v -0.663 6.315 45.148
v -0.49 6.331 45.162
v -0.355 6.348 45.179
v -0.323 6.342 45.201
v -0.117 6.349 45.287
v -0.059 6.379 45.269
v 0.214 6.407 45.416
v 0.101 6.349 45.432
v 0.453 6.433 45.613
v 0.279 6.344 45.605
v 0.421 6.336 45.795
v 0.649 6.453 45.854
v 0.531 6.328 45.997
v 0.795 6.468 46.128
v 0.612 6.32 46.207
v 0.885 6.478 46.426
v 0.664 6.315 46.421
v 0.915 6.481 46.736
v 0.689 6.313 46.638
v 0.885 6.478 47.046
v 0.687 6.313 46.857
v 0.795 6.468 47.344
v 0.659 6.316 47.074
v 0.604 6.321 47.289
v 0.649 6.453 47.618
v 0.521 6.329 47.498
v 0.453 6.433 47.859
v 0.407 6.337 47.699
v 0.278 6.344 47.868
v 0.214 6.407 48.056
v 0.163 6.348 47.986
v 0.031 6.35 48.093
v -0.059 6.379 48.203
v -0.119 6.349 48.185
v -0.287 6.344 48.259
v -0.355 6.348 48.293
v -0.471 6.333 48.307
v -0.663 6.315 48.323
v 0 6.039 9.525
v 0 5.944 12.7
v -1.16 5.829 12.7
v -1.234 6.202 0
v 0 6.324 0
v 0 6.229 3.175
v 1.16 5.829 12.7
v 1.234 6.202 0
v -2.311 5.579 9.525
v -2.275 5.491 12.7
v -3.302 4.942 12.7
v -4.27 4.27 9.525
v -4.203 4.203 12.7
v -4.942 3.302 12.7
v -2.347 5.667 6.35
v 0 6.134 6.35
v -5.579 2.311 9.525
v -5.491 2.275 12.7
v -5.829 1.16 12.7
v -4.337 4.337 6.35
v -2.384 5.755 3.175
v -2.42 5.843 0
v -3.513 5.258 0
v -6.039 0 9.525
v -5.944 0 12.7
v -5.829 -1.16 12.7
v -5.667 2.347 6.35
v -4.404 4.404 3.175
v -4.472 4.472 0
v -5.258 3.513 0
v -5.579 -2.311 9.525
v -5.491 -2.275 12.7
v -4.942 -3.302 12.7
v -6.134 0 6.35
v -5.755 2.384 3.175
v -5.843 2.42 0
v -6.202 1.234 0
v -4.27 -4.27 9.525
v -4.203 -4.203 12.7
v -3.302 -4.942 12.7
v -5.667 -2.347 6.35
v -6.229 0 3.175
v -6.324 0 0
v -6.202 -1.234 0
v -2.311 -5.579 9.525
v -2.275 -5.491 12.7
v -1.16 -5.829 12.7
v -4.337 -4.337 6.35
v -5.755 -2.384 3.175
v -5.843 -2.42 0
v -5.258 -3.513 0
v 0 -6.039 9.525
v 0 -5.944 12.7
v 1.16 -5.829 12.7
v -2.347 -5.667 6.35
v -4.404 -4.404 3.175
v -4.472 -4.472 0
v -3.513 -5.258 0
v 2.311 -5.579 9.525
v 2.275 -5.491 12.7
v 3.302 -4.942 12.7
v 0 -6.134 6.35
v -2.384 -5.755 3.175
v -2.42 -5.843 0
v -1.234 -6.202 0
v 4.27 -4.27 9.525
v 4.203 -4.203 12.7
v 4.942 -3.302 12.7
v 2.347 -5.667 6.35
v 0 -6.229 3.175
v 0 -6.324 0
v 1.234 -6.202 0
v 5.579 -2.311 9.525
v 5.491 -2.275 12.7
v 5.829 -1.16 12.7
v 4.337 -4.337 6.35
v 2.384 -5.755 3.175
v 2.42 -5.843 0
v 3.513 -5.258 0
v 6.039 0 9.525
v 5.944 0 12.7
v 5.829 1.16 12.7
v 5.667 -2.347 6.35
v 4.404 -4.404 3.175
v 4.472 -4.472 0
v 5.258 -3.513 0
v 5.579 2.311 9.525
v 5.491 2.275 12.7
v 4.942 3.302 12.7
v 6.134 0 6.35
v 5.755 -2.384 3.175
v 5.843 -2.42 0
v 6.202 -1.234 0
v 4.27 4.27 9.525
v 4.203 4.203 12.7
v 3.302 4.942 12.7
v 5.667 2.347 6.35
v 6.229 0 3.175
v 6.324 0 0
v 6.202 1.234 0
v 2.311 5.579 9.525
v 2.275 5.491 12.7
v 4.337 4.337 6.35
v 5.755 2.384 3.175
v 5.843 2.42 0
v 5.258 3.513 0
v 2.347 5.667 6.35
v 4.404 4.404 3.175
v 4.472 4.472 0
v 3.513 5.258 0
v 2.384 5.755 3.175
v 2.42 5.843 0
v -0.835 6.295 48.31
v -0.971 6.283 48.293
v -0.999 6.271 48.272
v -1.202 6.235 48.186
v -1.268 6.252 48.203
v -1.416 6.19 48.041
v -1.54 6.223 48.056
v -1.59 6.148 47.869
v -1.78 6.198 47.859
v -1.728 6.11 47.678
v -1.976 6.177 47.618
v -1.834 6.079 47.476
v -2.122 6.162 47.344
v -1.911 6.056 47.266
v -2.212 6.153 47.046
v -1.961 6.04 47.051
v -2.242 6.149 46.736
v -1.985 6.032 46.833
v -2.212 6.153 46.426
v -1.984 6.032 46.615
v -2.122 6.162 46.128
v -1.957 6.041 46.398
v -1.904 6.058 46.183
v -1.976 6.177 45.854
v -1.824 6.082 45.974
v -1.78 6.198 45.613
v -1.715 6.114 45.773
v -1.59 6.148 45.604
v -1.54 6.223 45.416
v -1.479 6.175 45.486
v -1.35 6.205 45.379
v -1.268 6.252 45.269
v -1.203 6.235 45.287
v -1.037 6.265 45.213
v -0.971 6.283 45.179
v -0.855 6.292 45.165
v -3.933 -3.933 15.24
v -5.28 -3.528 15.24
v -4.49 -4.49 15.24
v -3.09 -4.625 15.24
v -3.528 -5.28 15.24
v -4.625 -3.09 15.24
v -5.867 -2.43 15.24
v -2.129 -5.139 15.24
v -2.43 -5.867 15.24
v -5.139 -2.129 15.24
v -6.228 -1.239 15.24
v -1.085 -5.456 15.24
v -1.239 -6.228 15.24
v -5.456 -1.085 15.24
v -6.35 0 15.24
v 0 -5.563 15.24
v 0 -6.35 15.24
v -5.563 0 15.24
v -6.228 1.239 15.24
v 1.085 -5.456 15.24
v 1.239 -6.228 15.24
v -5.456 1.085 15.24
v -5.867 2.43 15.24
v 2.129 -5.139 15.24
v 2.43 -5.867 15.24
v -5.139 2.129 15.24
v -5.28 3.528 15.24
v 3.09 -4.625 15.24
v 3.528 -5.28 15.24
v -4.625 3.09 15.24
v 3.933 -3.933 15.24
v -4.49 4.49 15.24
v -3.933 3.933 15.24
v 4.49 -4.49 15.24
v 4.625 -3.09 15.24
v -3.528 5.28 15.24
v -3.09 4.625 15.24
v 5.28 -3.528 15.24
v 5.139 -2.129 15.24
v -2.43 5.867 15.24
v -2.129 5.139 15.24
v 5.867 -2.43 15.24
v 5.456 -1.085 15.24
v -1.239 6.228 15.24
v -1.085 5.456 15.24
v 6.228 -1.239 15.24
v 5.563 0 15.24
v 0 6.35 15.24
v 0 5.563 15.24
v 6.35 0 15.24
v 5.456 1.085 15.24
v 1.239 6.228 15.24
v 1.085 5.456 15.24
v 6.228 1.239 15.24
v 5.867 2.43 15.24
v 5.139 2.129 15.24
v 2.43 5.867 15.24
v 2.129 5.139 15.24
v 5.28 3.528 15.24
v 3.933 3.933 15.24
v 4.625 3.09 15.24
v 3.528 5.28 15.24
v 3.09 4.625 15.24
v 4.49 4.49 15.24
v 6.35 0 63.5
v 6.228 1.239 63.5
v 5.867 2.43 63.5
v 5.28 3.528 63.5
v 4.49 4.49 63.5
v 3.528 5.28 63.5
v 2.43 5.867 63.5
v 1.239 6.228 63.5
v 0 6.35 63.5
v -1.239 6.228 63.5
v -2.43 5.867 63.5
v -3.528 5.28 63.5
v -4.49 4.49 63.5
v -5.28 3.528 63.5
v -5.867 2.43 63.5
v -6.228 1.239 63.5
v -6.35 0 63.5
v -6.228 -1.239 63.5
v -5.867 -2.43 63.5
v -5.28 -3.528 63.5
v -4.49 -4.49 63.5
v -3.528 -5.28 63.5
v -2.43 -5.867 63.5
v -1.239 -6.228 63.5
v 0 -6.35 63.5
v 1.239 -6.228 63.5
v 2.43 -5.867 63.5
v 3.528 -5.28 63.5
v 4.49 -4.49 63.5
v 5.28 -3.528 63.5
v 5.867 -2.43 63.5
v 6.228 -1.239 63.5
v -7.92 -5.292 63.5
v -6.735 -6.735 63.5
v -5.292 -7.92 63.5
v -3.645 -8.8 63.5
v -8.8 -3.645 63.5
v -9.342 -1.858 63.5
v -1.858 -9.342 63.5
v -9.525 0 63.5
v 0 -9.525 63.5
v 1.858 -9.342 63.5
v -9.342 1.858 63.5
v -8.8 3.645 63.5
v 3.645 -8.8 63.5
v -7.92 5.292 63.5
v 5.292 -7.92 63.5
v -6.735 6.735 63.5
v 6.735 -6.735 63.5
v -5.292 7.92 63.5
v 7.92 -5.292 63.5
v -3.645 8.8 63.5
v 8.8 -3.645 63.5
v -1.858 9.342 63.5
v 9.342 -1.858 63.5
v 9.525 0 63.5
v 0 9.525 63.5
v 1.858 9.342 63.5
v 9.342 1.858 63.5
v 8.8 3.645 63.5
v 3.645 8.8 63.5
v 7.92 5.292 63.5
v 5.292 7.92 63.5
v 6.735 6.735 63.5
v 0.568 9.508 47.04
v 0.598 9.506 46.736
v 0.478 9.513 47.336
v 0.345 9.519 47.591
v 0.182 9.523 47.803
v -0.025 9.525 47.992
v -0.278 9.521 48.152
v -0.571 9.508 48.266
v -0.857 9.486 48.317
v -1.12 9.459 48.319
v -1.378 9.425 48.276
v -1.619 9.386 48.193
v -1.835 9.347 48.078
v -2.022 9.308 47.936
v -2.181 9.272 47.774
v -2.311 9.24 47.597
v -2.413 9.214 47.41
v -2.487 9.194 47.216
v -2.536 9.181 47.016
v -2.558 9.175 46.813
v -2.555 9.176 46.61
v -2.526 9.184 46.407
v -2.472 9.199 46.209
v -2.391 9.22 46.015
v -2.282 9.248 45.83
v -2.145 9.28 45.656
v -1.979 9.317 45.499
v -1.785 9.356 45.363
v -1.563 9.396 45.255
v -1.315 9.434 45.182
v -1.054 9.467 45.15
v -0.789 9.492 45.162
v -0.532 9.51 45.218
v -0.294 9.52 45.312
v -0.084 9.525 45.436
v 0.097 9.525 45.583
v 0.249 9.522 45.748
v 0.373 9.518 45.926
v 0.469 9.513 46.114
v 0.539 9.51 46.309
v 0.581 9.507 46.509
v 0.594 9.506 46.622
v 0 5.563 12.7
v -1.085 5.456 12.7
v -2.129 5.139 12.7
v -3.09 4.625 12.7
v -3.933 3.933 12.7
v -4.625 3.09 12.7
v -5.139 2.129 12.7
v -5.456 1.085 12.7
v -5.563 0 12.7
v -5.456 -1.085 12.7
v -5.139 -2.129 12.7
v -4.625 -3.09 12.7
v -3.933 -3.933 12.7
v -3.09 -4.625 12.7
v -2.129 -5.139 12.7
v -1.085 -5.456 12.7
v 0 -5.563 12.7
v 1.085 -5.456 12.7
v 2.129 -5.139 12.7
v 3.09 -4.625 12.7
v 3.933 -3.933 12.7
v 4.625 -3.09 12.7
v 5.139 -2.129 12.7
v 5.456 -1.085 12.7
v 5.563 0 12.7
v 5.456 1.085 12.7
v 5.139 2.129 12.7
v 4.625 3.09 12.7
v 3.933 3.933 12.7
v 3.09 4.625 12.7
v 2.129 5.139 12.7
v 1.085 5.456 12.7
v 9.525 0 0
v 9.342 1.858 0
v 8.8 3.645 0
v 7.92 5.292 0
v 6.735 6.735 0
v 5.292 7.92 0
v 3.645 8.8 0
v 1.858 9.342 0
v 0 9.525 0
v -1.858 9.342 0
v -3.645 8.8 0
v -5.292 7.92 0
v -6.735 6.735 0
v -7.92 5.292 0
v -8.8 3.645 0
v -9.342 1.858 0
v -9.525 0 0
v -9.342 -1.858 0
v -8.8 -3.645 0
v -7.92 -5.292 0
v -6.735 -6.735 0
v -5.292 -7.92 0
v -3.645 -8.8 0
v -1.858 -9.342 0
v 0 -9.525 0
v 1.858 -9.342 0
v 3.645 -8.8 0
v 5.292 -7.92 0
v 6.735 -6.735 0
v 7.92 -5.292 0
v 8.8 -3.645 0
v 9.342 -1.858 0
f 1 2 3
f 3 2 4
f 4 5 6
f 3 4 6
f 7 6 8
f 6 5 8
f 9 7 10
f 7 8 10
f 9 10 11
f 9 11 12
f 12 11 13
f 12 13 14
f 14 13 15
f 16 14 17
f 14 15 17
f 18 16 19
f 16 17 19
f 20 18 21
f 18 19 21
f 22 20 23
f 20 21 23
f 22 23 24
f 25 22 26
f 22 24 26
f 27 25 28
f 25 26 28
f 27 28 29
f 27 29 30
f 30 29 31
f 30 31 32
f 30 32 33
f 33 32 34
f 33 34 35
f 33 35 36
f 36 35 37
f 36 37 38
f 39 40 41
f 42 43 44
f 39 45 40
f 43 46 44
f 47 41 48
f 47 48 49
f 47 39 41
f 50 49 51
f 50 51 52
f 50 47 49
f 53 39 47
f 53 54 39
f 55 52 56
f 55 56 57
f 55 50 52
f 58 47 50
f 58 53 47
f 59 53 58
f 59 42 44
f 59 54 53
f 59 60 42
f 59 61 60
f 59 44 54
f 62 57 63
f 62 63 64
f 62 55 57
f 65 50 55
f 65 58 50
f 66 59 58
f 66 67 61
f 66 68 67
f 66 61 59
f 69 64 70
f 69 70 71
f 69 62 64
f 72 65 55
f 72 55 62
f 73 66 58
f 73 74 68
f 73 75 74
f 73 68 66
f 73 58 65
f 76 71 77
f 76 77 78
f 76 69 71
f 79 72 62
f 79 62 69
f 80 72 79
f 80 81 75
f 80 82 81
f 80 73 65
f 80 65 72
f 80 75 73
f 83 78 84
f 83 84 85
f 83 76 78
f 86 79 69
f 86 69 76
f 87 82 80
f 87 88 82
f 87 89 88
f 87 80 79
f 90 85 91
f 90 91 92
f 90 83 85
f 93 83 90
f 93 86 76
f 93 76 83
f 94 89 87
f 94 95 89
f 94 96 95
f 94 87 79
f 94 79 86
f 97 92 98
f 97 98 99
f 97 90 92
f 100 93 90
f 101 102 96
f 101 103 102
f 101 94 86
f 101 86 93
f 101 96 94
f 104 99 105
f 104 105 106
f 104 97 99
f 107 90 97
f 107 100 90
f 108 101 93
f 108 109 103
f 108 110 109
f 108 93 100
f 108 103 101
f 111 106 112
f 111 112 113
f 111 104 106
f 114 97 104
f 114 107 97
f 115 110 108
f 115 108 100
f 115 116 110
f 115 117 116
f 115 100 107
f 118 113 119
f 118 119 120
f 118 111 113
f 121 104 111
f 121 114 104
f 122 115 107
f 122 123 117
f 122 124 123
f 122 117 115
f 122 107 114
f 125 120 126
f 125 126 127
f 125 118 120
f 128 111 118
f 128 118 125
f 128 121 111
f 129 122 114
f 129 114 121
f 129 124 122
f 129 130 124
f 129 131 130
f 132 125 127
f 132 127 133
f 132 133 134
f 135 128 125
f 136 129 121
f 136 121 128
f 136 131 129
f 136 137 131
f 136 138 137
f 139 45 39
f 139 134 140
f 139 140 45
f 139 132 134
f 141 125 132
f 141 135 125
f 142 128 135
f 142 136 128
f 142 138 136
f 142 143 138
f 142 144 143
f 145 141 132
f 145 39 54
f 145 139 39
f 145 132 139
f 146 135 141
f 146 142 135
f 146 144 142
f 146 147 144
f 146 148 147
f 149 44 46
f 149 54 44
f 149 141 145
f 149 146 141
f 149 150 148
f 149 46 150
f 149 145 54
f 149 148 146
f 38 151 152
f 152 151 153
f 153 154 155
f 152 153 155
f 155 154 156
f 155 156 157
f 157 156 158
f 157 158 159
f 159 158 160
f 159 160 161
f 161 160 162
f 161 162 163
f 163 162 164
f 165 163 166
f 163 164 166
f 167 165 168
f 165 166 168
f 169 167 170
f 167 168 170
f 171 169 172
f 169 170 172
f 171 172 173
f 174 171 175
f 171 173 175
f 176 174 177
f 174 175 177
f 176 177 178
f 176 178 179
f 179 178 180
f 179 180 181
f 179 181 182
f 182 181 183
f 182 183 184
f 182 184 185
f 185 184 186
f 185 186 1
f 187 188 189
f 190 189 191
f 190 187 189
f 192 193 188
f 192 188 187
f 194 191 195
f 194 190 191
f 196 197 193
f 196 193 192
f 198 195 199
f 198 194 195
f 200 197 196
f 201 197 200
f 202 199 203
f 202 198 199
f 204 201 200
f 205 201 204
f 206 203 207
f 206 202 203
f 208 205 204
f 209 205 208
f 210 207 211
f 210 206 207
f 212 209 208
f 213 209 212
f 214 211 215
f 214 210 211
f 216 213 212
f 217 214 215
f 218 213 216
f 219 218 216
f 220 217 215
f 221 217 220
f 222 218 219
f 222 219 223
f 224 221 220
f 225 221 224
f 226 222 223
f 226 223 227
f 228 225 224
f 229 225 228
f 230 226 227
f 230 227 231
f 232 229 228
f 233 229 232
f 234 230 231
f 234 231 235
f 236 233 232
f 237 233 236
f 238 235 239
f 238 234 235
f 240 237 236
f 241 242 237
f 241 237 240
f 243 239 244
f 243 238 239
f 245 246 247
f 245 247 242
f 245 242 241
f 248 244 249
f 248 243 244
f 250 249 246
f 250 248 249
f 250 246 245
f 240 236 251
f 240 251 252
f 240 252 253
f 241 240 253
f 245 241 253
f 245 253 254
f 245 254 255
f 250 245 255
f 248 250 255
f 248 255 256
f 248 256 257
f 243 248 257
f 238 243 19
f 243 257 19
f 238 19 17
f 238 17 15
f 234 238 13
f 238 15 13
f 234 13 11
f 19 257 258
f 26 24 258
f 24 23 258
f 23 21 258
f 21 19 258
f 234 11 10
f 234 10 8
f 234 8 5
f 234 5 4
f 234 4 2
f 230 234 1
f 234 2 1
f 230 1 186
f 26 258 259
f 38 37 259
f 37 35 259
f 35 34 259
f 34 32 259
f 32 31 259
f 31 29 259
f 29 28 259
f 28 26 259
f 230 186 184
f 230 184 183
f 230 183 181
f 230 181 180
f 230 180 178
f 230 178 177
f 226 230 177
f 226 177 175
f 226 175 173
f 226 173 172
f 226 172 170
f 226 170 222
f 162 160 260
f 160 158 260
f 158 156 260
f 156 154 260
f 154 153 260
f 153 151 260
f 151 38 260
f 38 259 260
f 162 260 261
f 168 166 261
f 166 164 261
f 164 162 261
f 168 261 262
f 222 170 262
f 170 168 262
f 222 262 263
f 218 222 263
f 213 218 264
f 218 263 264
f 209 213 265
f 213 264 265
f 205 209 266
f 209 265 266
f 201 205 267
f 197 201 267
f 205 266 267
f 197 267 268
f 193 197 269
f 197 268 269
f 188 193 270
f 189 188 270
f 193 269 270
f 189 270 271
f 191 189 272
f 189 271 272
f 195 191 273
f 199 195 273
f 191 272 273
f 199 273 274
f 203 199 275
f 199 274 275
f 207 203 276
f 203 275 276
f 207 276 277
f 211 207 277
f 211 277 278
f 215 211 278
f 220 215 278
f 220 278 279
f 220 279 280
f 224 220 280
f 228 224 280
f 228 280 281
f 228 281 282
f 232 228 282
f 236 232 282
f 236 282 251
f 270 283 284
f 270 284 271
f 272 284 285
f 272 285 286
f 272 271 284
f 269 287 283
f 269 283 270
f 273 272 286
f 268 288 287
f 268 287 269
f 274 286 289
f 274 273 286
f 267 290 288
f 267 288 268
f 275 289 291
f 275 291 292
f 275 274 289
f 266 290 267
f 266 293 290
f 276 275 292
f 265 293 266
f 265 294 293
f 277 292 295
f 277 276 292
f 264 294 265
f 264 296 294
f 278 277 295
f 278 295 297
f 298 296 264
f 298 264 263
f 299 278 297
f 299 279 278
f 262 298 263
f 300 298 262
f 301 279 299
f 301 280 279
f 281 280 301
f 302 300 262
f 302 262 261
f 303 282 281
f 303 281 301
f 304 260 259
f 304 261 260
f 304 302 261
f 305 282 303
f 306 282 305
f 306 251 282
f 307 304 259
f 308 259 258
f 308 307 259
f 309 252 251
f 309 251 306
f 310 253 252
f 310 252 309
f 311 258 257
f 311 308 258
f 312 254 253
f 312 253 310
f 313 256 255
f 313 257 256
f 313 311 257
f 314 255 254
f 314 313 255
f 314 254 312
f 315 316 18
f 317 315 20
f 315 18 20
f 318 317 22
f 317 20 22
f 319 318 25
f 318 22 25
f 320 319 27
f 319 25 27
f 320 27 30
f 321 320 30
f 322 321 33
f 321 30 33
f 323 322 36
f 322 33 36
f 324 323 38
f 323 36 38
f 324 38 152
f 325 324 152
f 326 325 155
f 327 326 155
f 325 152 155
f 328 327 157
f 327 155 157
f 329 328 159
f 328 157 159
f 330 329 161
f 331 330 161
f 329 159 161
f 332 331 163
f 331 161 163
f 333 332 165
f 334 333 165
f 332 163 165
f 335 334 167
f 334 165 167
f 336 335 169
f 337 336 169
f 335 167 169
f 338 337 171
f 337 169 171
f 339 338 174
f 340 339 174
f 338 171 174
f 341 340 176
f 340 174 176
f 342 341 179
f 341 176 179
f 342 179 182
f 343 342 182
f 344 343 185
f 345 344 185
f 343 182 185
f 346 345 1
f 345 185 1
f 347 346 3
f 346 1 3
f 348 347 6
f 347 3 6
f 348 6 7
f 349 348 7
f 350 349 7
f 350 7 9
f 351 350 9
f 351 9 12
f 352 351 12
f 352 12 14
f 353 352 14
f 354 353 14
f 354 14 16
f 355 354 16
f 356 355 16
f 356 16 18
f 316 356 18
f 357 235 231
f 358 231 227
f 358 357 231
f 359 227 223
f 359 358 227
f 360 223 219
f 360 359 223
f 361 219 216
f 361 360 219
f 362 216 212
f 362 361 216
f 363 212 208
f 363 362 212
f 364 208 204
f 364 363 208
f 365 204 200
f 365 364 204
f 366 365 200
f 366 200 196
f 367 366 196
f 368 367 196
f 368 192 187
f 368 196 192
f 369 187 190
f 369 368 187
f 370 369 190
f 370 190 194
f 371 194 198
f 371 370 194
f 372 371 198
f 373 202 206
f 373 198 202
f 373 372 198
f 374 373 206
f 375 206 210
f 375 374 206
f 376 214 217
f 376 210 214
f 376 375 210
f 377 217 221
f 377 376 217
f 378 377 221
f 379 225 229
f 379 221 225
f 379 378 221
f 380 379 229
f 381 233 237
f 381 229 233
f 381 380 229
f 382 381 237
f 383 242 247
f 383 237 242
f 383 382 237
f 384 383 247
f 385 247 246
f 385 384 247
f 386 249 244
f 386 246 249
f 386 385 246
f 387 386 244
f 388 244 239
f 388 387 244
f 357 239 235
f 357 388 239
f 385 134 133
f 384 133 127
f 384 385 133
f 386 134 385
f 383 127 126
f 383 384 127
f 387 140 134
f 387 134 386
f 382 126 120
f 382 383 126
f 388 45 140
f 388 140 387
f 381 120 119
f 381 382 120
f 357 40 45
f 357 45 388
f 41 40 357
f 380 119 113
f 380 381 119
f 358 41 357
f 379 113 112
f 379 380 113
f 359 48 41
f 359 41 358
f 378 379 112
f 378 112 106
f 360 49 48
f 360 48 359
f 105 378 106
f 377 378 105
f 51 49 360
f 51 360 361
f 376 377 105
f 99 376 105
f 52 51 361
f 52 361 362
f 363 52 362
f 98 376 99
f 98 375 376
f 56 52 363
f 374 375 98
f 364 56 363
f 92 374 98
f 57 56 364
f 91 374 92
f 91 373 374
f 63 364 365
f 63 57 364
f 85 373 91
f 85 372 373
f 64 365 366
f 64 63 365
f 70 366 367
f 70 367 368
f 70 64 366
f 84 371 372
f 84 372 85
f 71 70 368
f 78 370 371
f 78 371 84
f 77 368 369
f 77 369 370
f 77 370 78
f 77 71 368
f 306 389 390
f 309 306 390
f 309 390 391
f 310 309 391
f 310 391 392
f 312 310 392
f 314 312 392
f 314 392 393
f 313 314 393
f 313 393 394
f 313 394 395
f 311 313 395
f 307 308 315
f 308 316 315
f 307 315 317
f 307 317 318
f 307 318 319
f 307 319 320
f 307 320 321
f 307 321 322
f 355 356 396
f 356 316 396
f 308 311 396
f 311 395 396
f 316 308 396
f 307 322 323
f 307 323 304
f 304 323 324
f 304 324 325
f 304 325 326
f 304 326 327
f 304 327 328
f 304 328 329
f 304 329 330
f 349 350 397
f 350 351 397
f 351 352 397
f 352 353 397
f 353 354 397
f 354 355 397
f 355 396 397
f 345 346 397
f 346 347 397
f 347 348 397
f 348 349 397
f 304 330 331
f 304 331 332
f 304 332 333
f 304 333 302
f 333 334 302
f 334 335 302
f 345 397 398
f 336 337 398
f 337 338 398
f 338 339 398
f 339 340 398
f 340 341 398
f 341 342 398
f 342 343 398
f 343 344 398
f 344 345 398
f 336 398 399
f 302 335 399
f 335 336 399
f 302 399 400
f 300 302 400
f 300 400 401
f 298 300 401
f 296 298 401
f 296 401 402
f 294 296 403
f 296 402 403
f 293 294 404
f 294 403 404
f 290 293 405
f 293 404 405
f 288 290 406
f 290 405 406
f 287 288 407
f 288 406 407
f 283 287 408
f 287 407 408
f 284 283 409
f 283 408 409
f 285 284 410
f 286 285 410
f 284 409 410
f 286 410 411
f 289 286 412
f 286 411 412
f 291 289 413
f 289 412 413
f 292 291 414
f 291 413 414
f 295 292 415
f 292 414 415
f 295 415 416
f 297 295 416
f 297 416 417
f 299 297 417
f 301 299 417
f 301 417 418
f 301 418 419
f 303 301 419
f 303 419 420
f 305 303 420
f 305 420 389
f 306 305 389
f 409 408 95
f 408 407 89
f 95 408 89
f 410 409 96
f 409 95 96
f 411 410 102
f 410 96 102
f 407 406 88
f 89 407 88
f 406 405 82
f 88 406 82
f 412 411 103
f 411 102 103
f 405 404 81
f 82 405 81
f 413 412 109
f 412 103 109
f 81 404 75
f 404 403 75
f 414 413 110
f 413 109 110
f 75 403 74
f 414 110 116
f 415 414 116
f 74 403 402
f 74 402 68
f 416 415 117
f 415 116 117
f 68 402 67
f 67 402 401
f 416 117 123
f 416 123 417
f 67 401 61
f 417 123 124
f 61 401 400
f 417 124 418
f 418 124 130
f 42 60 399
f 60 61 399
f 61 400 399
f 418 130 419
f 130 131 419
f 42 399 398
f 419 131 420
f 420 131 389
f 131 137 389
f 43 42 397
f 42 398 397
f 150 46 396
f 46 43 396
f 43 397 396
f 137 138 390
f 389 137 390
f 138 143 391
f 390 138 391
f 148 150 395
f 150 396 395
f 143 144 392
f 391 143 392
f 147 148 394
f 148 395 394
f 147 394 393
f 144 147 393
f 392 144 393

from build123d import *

# Parameters (mm, degrees)
SKETCH1_R           = 9.525
BOSS_EXTRUDE1_DEPTH = 63.5
SKETCH3_R           = 6.35
CUT_EXTRUDE2_DEPTH  = 48.26


# Read off the part's stored shape, not the designer's step: 1/8 (0.125) Diameter Hole1
with BuildPart() as part:
    # Sketch1 → Boss-Extrude1 (new body)
    with BuildSketch(Plane.XY):
        Circle(SKETCH1_R)
    extrude(amount=BOSS_EXTRUDE1_DEPTH)

    # Sketch3 → Cut-Extrude2 (cut)
    with BuildSketch(Plane.XY.offset(63.5)):
        Circle(SKETCH3_R)
    extrude(amount=-CUT_EXTRUDE2_DEPTH, mode=Mode.SUBTRACT)

    # 1/8 (0.125) Diameter Hole1 outline → 1/8 (0.125) Diameter Hole1 (revolve, cut)
    with BuildSketch(Plane(origin=(0, 0, 46.736), x_dir=(0.99452895474108, 0.10446127599074502, 0), z_dir=(0, 0, -1))):
        Polygon((1.5875, -9.525019471), (1.5875, -6.35), (1.346904209, -6.205435464), (0, -6.205435464), (0, -9.525019471), align=None)
    revolve(axis=Axis((0, 0, 46.736), (0.10446127599074502, -0.99452895474108, 0)), mode=Mode.SUBTRACT)

    # Sketch11 → 1/4 NPT Tapped Hole1 (revolve, cut)
    with BuildSketch(Plane.YZ):
        Polygon((0, 0), (0, 19.852347279), (5.5626, 16.51), (5.5626, 12.7), (5.943684593, 12.7), (6.3239396, 0), align=None)
    revolve(axis=Axis((0, 0, -6.35), (0, 0, 1)), mode=Mode.SUBTRACT)


solid = part.part
